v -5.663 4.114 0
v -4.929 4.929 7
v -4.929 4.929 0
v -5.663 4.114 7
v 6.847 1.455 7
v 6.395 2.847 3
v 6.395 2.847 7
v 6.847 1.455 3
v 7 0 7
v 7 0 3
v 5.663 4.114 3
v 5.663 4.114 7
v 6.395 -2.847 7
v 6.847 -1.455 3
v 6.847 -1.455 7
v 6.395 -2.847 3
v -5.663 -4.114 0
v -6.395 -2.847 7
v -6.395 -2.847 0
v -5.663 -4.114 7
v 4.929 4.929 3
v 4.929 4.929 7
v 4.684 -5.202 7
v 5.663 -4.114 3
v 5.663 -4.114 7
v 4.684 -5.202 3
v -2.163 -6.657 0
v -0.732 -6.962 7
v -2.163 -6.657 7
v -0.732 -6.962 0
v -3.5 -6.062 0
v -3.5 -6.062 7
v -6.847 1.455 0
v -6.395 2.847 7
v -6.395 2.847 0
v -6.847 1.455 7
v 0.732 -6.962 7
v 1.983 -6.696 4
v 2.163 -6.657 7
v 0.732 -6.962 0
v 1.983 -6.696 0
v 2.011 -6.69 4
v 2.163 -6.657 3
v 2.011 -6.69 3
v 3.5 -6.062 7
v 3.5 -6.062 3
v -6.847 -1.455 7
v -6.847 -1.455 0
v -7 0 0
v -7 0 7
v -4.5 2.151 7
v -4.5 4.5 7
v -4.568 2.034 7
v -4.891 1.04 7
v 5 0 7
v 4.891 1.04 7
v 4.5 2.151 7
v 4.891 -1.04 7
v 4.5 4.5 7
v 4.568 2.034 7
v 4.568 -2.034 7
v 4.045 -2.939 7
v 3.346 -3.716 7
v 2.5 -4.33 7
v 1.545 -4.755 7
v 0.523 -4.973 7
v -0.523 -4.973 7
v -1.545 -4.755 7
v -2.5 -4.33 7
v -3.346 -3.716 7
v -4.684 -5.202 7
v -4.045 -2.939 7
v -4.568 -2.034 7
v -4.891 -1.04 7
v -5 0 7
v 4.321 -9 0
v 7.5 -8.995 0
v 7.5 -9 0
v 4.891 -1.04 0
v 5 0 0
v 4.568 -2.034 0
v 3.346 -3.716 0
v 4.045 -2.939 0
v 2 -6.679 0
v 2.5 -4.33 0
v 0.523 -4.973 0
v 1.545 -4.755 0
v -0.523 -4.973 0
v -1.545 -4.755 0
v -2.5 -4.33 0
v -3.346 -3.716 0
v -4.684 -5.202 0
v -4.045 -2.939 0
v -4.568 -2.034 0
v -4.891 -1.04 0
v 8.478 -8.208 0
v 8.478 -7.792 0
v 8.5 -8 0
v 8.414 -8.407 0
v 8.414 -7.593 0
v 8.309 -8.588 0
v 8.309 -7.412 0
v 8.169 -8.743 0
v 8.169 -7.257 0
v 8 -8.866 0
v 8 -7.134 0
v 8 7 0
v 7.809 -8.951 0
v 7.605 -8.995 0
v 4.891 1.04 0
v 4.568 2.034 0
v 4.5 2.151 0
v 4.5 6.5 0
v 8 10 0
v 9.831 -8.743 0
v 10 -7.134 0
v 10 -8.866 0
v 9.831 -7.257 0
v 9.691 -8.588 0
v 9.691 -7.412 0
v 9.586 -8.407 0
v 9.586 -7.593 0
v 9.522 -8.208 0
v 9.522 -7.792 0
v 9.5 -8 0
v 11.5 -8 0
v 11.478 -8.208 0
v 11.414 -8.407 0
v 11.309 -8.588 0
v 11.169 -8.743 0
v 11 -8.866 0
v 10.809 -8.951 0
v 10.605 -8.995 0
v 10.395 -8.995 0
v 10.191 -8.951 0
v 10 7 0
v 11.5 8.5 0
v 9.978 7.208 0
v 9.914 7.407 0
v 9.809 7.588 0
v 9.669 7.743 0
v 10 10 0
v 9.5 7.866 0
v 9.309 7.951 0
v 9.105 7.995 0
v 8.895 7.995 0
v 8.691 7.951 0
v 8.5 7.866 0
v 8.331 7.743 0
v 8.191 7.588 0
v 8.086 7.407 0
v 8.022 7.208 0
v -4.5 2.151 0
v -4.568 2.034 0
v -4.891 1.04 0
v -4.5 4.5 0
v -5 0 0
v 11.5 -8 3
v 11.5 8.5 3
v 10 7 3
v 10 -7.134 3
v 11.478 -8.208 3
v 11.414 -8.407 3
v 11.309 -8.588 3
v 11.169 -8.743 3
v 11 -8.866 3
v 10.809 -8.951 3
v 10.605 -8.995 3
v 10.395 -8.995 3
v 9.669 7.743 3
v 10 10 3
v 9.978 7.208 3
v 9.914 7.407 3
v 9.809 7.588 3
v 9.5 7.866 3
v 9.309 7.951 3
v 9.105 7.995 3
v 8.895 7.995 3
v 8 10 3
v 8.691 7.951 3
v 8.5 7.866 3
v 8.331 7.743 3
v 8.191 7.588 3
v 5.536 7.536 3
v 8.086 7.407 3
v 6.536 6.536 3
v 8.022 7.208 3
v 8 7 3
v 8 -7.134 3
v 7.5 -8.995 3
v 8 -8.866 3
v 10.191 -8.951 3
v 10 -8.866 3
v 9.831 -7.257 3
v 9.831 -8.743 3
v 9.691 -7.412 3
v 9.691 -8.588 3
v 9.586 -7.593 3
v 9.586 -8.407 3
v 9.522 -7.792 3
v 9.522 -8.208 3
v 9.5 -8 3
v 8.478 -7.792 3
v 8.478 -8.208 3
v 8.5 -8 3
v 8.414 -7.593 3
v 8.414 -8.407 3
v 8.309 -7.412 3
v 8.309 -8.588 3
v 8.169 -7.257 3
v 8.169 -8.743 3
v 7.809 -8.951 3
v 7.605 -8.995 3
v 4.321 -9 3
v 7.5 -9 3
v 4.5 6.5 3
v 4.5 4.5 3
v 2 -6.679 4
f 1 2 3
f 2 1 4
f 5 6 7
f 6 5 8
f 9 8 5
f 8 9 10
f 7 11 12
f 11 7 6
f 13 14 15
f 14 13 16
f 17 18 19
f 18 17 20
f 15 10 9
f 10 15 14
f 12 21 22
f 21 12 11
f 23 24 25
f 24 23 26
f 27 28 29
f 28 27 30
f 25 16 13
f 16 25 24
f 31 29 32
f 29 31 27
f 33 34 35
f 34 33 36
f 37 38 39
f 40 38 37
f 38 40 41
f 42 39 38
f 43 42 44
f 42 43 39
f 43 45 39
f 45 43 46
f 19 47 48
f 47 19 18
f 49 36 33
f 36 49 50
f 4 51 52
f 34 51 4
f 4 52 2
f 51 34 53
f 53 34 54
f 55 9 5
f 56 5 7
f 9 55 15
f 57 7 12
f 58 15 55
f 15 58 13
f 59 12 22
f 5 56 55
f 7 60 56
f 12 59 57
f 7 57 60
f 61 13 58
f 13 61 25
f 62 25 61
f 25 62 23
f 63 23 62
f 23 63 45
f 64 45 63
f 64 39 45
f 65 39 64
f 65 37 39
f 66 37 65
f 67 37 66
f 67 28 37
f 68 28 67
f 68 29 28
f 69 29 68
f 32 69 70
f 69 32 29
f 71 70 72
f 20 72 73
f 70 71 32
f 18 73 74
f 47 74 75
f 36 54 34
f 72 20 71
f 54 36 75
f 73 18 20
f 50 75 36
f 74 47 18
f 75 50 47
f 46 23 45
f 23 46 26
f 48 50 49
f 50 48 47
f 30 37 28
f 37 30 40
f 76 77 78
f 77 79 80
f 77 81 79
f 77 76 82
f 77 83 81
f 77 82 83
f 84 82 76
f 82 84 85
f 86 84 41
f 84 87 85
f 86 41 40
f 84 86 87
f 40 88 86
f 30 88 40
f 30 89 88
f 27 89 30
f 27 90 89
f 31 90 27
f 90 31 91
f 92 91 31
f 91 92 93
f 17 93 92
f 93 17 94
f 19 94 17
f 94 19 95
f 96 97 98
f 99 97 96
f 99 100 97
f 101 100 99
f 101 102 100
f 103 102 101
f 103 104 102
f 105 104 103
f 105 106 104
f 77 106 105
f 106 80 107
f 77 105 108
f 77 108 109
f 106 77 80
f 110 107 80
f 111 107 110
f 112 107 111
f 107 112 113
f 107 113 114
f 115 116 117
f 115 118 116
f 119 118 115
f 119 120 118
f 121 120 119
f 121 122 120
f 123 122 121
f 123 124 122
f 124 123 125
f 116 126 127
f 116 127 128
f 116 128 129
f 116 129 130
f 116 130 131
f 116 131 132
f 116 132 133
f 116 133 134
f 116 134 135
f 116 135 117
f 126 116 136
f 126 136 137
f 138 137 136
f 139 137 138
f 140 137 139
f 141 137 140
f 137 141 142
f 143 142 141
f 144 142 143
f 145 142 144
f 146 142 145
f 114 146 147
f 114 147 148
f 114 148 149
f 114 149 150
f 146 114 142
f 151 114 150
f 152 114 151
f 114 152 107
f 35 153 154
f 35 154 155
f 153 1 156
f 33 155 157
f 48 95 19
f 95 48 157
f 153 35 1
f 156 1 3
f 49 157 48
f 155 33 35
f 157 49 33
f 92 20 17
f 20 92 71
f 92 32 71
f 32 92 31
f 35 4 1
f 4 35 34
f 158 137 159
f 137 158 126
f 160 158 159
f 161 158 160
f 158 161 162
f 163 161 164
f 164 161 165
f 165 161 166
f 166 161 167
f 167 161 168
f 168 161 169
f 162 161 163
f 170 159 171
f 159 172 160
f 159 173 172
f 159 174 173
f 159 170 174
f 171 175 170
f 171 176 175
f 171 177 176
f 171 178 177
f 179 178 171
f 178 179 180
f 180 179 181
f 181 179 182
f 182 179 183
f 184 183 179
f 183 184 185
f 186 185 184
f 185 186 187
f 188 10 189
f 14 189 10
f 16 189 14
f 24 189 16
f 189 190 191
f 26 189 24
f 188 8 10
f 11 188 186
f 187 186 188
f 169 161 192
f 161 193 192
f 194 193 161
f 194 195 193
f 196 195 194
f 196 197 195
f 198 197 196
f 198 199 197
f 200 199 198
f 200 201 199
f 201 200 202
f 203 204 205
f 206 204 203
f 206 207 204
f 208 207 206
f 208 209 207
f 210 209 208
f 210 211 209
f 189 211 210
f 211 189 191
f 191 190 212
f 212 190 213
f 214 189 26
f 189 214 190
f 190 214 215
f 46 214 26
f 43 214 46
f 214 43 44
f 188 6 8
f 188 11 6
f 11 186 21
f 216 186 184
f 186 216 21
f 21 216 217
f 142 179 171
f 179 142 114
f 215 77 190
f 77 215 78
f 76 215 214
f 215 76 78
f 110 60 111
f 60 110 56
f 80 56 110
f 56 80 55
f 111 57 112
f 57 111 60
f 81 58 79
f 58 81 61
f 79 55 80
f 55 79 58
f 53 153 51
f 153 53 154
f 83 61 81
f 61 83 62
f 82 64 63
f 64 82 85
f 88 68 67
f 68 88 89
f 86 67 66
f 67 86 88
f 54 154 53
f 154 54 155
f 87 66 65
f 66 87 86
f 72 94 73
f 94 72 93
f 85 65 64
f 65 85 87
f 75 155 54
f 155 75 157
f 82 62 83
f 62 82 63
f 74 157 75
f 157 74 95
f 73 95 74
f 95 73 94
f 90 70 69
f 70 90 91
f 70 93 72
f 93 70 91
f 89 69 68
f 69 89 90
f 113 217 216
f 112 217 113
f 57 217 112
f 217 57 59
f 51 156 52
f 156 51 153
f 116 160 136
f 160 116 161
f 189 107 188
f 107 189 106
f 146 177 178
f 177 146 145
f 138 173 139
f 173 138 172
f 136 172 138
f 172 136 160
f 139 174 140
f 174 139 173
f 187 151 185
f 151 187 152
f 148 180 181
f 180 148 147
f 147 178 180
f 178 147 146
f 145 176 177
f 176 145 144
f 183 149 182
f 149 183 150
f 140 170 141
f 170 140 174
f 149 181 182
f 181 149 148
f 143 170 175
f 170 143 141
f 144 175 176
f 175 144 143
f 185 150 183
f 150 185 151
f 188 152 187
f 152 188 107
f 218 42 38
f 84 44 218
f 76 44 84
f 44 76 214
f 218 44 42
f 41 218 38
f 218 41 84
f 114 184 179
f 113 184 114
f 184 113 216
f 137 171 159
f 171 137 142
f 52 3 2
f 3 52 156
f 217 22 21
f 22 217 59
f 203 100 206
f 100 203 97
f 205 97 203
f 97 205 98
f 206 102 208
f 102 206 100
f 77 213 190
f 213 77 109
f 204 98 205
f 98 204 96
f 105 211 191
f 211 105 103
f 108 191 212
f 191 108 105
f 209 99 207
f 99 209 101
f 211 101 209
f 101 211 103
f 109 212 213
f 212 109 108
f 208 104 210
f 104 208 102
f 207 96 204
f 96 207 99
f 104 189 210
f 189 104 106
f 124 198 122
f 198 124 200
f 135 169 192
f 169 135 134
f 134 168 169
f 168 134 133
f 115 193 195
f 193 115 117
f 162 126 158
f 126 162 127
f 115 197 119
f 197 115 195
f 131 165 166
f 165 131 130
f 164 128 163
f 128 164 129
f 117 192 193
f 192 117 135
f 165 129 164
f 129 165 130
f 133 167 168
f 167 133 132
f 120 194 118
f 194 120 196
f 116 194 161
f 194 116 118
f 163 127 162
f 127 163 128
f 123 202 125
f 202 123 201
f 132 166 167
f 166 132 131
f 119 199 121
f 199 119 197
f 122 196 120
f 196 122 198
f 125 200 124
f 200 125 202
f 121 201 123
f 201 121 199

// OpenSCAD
// PRUSA iteration3
// LCD cable clip
// GNU GPL v3
// Josef Průša <iam@josefprusa.cz> and contributors
// http://www.reprap.org/wiki/Prusa_Mendel
// http://prusamendel.org

// body
difference(){
    union(){
    cylinder(r=7,h=7,$fn=30);
    translate([2,-8,0]) cube([9.5,18,3]);
    translate([2,-9,0]) cube([5.5,5,3]);
    }

// rod cutout
translate([0,0,-1]) cylinder(r=5,h=10,$fn=30);
translate([-4.5,0,-5]) cube([9,15,15]);

// LCD cable cut
translate([8,-12,-1]) cube([2,19,5]);
translate([9,7,-1]) cylinder(r=1,h=5,$fn=30);

    //corners
    translate([2,-13.75,-1]) rotate([0,0,45]) cube([5,5,5]);
    translate([4,6,-1]) rotate([0,0,45]) cube([10,10,5]);
    translate([14,6,-1]) rotate([0,0,45]) cube([10,10,5]);
    translate([-3,3,-1]) rotate([0,0,45]) cube([5,5,10]);
    translate([3,3,3]) rotate([0,0,45]) cube([5,5,10]);
}

// LCD cable cut ends
translate([7.5,-8,0]) cylinder(r=1,h=3,$fn=30);
translate([10.5,-8,0]) cylinder(r=1,h=3,$fn=30);
